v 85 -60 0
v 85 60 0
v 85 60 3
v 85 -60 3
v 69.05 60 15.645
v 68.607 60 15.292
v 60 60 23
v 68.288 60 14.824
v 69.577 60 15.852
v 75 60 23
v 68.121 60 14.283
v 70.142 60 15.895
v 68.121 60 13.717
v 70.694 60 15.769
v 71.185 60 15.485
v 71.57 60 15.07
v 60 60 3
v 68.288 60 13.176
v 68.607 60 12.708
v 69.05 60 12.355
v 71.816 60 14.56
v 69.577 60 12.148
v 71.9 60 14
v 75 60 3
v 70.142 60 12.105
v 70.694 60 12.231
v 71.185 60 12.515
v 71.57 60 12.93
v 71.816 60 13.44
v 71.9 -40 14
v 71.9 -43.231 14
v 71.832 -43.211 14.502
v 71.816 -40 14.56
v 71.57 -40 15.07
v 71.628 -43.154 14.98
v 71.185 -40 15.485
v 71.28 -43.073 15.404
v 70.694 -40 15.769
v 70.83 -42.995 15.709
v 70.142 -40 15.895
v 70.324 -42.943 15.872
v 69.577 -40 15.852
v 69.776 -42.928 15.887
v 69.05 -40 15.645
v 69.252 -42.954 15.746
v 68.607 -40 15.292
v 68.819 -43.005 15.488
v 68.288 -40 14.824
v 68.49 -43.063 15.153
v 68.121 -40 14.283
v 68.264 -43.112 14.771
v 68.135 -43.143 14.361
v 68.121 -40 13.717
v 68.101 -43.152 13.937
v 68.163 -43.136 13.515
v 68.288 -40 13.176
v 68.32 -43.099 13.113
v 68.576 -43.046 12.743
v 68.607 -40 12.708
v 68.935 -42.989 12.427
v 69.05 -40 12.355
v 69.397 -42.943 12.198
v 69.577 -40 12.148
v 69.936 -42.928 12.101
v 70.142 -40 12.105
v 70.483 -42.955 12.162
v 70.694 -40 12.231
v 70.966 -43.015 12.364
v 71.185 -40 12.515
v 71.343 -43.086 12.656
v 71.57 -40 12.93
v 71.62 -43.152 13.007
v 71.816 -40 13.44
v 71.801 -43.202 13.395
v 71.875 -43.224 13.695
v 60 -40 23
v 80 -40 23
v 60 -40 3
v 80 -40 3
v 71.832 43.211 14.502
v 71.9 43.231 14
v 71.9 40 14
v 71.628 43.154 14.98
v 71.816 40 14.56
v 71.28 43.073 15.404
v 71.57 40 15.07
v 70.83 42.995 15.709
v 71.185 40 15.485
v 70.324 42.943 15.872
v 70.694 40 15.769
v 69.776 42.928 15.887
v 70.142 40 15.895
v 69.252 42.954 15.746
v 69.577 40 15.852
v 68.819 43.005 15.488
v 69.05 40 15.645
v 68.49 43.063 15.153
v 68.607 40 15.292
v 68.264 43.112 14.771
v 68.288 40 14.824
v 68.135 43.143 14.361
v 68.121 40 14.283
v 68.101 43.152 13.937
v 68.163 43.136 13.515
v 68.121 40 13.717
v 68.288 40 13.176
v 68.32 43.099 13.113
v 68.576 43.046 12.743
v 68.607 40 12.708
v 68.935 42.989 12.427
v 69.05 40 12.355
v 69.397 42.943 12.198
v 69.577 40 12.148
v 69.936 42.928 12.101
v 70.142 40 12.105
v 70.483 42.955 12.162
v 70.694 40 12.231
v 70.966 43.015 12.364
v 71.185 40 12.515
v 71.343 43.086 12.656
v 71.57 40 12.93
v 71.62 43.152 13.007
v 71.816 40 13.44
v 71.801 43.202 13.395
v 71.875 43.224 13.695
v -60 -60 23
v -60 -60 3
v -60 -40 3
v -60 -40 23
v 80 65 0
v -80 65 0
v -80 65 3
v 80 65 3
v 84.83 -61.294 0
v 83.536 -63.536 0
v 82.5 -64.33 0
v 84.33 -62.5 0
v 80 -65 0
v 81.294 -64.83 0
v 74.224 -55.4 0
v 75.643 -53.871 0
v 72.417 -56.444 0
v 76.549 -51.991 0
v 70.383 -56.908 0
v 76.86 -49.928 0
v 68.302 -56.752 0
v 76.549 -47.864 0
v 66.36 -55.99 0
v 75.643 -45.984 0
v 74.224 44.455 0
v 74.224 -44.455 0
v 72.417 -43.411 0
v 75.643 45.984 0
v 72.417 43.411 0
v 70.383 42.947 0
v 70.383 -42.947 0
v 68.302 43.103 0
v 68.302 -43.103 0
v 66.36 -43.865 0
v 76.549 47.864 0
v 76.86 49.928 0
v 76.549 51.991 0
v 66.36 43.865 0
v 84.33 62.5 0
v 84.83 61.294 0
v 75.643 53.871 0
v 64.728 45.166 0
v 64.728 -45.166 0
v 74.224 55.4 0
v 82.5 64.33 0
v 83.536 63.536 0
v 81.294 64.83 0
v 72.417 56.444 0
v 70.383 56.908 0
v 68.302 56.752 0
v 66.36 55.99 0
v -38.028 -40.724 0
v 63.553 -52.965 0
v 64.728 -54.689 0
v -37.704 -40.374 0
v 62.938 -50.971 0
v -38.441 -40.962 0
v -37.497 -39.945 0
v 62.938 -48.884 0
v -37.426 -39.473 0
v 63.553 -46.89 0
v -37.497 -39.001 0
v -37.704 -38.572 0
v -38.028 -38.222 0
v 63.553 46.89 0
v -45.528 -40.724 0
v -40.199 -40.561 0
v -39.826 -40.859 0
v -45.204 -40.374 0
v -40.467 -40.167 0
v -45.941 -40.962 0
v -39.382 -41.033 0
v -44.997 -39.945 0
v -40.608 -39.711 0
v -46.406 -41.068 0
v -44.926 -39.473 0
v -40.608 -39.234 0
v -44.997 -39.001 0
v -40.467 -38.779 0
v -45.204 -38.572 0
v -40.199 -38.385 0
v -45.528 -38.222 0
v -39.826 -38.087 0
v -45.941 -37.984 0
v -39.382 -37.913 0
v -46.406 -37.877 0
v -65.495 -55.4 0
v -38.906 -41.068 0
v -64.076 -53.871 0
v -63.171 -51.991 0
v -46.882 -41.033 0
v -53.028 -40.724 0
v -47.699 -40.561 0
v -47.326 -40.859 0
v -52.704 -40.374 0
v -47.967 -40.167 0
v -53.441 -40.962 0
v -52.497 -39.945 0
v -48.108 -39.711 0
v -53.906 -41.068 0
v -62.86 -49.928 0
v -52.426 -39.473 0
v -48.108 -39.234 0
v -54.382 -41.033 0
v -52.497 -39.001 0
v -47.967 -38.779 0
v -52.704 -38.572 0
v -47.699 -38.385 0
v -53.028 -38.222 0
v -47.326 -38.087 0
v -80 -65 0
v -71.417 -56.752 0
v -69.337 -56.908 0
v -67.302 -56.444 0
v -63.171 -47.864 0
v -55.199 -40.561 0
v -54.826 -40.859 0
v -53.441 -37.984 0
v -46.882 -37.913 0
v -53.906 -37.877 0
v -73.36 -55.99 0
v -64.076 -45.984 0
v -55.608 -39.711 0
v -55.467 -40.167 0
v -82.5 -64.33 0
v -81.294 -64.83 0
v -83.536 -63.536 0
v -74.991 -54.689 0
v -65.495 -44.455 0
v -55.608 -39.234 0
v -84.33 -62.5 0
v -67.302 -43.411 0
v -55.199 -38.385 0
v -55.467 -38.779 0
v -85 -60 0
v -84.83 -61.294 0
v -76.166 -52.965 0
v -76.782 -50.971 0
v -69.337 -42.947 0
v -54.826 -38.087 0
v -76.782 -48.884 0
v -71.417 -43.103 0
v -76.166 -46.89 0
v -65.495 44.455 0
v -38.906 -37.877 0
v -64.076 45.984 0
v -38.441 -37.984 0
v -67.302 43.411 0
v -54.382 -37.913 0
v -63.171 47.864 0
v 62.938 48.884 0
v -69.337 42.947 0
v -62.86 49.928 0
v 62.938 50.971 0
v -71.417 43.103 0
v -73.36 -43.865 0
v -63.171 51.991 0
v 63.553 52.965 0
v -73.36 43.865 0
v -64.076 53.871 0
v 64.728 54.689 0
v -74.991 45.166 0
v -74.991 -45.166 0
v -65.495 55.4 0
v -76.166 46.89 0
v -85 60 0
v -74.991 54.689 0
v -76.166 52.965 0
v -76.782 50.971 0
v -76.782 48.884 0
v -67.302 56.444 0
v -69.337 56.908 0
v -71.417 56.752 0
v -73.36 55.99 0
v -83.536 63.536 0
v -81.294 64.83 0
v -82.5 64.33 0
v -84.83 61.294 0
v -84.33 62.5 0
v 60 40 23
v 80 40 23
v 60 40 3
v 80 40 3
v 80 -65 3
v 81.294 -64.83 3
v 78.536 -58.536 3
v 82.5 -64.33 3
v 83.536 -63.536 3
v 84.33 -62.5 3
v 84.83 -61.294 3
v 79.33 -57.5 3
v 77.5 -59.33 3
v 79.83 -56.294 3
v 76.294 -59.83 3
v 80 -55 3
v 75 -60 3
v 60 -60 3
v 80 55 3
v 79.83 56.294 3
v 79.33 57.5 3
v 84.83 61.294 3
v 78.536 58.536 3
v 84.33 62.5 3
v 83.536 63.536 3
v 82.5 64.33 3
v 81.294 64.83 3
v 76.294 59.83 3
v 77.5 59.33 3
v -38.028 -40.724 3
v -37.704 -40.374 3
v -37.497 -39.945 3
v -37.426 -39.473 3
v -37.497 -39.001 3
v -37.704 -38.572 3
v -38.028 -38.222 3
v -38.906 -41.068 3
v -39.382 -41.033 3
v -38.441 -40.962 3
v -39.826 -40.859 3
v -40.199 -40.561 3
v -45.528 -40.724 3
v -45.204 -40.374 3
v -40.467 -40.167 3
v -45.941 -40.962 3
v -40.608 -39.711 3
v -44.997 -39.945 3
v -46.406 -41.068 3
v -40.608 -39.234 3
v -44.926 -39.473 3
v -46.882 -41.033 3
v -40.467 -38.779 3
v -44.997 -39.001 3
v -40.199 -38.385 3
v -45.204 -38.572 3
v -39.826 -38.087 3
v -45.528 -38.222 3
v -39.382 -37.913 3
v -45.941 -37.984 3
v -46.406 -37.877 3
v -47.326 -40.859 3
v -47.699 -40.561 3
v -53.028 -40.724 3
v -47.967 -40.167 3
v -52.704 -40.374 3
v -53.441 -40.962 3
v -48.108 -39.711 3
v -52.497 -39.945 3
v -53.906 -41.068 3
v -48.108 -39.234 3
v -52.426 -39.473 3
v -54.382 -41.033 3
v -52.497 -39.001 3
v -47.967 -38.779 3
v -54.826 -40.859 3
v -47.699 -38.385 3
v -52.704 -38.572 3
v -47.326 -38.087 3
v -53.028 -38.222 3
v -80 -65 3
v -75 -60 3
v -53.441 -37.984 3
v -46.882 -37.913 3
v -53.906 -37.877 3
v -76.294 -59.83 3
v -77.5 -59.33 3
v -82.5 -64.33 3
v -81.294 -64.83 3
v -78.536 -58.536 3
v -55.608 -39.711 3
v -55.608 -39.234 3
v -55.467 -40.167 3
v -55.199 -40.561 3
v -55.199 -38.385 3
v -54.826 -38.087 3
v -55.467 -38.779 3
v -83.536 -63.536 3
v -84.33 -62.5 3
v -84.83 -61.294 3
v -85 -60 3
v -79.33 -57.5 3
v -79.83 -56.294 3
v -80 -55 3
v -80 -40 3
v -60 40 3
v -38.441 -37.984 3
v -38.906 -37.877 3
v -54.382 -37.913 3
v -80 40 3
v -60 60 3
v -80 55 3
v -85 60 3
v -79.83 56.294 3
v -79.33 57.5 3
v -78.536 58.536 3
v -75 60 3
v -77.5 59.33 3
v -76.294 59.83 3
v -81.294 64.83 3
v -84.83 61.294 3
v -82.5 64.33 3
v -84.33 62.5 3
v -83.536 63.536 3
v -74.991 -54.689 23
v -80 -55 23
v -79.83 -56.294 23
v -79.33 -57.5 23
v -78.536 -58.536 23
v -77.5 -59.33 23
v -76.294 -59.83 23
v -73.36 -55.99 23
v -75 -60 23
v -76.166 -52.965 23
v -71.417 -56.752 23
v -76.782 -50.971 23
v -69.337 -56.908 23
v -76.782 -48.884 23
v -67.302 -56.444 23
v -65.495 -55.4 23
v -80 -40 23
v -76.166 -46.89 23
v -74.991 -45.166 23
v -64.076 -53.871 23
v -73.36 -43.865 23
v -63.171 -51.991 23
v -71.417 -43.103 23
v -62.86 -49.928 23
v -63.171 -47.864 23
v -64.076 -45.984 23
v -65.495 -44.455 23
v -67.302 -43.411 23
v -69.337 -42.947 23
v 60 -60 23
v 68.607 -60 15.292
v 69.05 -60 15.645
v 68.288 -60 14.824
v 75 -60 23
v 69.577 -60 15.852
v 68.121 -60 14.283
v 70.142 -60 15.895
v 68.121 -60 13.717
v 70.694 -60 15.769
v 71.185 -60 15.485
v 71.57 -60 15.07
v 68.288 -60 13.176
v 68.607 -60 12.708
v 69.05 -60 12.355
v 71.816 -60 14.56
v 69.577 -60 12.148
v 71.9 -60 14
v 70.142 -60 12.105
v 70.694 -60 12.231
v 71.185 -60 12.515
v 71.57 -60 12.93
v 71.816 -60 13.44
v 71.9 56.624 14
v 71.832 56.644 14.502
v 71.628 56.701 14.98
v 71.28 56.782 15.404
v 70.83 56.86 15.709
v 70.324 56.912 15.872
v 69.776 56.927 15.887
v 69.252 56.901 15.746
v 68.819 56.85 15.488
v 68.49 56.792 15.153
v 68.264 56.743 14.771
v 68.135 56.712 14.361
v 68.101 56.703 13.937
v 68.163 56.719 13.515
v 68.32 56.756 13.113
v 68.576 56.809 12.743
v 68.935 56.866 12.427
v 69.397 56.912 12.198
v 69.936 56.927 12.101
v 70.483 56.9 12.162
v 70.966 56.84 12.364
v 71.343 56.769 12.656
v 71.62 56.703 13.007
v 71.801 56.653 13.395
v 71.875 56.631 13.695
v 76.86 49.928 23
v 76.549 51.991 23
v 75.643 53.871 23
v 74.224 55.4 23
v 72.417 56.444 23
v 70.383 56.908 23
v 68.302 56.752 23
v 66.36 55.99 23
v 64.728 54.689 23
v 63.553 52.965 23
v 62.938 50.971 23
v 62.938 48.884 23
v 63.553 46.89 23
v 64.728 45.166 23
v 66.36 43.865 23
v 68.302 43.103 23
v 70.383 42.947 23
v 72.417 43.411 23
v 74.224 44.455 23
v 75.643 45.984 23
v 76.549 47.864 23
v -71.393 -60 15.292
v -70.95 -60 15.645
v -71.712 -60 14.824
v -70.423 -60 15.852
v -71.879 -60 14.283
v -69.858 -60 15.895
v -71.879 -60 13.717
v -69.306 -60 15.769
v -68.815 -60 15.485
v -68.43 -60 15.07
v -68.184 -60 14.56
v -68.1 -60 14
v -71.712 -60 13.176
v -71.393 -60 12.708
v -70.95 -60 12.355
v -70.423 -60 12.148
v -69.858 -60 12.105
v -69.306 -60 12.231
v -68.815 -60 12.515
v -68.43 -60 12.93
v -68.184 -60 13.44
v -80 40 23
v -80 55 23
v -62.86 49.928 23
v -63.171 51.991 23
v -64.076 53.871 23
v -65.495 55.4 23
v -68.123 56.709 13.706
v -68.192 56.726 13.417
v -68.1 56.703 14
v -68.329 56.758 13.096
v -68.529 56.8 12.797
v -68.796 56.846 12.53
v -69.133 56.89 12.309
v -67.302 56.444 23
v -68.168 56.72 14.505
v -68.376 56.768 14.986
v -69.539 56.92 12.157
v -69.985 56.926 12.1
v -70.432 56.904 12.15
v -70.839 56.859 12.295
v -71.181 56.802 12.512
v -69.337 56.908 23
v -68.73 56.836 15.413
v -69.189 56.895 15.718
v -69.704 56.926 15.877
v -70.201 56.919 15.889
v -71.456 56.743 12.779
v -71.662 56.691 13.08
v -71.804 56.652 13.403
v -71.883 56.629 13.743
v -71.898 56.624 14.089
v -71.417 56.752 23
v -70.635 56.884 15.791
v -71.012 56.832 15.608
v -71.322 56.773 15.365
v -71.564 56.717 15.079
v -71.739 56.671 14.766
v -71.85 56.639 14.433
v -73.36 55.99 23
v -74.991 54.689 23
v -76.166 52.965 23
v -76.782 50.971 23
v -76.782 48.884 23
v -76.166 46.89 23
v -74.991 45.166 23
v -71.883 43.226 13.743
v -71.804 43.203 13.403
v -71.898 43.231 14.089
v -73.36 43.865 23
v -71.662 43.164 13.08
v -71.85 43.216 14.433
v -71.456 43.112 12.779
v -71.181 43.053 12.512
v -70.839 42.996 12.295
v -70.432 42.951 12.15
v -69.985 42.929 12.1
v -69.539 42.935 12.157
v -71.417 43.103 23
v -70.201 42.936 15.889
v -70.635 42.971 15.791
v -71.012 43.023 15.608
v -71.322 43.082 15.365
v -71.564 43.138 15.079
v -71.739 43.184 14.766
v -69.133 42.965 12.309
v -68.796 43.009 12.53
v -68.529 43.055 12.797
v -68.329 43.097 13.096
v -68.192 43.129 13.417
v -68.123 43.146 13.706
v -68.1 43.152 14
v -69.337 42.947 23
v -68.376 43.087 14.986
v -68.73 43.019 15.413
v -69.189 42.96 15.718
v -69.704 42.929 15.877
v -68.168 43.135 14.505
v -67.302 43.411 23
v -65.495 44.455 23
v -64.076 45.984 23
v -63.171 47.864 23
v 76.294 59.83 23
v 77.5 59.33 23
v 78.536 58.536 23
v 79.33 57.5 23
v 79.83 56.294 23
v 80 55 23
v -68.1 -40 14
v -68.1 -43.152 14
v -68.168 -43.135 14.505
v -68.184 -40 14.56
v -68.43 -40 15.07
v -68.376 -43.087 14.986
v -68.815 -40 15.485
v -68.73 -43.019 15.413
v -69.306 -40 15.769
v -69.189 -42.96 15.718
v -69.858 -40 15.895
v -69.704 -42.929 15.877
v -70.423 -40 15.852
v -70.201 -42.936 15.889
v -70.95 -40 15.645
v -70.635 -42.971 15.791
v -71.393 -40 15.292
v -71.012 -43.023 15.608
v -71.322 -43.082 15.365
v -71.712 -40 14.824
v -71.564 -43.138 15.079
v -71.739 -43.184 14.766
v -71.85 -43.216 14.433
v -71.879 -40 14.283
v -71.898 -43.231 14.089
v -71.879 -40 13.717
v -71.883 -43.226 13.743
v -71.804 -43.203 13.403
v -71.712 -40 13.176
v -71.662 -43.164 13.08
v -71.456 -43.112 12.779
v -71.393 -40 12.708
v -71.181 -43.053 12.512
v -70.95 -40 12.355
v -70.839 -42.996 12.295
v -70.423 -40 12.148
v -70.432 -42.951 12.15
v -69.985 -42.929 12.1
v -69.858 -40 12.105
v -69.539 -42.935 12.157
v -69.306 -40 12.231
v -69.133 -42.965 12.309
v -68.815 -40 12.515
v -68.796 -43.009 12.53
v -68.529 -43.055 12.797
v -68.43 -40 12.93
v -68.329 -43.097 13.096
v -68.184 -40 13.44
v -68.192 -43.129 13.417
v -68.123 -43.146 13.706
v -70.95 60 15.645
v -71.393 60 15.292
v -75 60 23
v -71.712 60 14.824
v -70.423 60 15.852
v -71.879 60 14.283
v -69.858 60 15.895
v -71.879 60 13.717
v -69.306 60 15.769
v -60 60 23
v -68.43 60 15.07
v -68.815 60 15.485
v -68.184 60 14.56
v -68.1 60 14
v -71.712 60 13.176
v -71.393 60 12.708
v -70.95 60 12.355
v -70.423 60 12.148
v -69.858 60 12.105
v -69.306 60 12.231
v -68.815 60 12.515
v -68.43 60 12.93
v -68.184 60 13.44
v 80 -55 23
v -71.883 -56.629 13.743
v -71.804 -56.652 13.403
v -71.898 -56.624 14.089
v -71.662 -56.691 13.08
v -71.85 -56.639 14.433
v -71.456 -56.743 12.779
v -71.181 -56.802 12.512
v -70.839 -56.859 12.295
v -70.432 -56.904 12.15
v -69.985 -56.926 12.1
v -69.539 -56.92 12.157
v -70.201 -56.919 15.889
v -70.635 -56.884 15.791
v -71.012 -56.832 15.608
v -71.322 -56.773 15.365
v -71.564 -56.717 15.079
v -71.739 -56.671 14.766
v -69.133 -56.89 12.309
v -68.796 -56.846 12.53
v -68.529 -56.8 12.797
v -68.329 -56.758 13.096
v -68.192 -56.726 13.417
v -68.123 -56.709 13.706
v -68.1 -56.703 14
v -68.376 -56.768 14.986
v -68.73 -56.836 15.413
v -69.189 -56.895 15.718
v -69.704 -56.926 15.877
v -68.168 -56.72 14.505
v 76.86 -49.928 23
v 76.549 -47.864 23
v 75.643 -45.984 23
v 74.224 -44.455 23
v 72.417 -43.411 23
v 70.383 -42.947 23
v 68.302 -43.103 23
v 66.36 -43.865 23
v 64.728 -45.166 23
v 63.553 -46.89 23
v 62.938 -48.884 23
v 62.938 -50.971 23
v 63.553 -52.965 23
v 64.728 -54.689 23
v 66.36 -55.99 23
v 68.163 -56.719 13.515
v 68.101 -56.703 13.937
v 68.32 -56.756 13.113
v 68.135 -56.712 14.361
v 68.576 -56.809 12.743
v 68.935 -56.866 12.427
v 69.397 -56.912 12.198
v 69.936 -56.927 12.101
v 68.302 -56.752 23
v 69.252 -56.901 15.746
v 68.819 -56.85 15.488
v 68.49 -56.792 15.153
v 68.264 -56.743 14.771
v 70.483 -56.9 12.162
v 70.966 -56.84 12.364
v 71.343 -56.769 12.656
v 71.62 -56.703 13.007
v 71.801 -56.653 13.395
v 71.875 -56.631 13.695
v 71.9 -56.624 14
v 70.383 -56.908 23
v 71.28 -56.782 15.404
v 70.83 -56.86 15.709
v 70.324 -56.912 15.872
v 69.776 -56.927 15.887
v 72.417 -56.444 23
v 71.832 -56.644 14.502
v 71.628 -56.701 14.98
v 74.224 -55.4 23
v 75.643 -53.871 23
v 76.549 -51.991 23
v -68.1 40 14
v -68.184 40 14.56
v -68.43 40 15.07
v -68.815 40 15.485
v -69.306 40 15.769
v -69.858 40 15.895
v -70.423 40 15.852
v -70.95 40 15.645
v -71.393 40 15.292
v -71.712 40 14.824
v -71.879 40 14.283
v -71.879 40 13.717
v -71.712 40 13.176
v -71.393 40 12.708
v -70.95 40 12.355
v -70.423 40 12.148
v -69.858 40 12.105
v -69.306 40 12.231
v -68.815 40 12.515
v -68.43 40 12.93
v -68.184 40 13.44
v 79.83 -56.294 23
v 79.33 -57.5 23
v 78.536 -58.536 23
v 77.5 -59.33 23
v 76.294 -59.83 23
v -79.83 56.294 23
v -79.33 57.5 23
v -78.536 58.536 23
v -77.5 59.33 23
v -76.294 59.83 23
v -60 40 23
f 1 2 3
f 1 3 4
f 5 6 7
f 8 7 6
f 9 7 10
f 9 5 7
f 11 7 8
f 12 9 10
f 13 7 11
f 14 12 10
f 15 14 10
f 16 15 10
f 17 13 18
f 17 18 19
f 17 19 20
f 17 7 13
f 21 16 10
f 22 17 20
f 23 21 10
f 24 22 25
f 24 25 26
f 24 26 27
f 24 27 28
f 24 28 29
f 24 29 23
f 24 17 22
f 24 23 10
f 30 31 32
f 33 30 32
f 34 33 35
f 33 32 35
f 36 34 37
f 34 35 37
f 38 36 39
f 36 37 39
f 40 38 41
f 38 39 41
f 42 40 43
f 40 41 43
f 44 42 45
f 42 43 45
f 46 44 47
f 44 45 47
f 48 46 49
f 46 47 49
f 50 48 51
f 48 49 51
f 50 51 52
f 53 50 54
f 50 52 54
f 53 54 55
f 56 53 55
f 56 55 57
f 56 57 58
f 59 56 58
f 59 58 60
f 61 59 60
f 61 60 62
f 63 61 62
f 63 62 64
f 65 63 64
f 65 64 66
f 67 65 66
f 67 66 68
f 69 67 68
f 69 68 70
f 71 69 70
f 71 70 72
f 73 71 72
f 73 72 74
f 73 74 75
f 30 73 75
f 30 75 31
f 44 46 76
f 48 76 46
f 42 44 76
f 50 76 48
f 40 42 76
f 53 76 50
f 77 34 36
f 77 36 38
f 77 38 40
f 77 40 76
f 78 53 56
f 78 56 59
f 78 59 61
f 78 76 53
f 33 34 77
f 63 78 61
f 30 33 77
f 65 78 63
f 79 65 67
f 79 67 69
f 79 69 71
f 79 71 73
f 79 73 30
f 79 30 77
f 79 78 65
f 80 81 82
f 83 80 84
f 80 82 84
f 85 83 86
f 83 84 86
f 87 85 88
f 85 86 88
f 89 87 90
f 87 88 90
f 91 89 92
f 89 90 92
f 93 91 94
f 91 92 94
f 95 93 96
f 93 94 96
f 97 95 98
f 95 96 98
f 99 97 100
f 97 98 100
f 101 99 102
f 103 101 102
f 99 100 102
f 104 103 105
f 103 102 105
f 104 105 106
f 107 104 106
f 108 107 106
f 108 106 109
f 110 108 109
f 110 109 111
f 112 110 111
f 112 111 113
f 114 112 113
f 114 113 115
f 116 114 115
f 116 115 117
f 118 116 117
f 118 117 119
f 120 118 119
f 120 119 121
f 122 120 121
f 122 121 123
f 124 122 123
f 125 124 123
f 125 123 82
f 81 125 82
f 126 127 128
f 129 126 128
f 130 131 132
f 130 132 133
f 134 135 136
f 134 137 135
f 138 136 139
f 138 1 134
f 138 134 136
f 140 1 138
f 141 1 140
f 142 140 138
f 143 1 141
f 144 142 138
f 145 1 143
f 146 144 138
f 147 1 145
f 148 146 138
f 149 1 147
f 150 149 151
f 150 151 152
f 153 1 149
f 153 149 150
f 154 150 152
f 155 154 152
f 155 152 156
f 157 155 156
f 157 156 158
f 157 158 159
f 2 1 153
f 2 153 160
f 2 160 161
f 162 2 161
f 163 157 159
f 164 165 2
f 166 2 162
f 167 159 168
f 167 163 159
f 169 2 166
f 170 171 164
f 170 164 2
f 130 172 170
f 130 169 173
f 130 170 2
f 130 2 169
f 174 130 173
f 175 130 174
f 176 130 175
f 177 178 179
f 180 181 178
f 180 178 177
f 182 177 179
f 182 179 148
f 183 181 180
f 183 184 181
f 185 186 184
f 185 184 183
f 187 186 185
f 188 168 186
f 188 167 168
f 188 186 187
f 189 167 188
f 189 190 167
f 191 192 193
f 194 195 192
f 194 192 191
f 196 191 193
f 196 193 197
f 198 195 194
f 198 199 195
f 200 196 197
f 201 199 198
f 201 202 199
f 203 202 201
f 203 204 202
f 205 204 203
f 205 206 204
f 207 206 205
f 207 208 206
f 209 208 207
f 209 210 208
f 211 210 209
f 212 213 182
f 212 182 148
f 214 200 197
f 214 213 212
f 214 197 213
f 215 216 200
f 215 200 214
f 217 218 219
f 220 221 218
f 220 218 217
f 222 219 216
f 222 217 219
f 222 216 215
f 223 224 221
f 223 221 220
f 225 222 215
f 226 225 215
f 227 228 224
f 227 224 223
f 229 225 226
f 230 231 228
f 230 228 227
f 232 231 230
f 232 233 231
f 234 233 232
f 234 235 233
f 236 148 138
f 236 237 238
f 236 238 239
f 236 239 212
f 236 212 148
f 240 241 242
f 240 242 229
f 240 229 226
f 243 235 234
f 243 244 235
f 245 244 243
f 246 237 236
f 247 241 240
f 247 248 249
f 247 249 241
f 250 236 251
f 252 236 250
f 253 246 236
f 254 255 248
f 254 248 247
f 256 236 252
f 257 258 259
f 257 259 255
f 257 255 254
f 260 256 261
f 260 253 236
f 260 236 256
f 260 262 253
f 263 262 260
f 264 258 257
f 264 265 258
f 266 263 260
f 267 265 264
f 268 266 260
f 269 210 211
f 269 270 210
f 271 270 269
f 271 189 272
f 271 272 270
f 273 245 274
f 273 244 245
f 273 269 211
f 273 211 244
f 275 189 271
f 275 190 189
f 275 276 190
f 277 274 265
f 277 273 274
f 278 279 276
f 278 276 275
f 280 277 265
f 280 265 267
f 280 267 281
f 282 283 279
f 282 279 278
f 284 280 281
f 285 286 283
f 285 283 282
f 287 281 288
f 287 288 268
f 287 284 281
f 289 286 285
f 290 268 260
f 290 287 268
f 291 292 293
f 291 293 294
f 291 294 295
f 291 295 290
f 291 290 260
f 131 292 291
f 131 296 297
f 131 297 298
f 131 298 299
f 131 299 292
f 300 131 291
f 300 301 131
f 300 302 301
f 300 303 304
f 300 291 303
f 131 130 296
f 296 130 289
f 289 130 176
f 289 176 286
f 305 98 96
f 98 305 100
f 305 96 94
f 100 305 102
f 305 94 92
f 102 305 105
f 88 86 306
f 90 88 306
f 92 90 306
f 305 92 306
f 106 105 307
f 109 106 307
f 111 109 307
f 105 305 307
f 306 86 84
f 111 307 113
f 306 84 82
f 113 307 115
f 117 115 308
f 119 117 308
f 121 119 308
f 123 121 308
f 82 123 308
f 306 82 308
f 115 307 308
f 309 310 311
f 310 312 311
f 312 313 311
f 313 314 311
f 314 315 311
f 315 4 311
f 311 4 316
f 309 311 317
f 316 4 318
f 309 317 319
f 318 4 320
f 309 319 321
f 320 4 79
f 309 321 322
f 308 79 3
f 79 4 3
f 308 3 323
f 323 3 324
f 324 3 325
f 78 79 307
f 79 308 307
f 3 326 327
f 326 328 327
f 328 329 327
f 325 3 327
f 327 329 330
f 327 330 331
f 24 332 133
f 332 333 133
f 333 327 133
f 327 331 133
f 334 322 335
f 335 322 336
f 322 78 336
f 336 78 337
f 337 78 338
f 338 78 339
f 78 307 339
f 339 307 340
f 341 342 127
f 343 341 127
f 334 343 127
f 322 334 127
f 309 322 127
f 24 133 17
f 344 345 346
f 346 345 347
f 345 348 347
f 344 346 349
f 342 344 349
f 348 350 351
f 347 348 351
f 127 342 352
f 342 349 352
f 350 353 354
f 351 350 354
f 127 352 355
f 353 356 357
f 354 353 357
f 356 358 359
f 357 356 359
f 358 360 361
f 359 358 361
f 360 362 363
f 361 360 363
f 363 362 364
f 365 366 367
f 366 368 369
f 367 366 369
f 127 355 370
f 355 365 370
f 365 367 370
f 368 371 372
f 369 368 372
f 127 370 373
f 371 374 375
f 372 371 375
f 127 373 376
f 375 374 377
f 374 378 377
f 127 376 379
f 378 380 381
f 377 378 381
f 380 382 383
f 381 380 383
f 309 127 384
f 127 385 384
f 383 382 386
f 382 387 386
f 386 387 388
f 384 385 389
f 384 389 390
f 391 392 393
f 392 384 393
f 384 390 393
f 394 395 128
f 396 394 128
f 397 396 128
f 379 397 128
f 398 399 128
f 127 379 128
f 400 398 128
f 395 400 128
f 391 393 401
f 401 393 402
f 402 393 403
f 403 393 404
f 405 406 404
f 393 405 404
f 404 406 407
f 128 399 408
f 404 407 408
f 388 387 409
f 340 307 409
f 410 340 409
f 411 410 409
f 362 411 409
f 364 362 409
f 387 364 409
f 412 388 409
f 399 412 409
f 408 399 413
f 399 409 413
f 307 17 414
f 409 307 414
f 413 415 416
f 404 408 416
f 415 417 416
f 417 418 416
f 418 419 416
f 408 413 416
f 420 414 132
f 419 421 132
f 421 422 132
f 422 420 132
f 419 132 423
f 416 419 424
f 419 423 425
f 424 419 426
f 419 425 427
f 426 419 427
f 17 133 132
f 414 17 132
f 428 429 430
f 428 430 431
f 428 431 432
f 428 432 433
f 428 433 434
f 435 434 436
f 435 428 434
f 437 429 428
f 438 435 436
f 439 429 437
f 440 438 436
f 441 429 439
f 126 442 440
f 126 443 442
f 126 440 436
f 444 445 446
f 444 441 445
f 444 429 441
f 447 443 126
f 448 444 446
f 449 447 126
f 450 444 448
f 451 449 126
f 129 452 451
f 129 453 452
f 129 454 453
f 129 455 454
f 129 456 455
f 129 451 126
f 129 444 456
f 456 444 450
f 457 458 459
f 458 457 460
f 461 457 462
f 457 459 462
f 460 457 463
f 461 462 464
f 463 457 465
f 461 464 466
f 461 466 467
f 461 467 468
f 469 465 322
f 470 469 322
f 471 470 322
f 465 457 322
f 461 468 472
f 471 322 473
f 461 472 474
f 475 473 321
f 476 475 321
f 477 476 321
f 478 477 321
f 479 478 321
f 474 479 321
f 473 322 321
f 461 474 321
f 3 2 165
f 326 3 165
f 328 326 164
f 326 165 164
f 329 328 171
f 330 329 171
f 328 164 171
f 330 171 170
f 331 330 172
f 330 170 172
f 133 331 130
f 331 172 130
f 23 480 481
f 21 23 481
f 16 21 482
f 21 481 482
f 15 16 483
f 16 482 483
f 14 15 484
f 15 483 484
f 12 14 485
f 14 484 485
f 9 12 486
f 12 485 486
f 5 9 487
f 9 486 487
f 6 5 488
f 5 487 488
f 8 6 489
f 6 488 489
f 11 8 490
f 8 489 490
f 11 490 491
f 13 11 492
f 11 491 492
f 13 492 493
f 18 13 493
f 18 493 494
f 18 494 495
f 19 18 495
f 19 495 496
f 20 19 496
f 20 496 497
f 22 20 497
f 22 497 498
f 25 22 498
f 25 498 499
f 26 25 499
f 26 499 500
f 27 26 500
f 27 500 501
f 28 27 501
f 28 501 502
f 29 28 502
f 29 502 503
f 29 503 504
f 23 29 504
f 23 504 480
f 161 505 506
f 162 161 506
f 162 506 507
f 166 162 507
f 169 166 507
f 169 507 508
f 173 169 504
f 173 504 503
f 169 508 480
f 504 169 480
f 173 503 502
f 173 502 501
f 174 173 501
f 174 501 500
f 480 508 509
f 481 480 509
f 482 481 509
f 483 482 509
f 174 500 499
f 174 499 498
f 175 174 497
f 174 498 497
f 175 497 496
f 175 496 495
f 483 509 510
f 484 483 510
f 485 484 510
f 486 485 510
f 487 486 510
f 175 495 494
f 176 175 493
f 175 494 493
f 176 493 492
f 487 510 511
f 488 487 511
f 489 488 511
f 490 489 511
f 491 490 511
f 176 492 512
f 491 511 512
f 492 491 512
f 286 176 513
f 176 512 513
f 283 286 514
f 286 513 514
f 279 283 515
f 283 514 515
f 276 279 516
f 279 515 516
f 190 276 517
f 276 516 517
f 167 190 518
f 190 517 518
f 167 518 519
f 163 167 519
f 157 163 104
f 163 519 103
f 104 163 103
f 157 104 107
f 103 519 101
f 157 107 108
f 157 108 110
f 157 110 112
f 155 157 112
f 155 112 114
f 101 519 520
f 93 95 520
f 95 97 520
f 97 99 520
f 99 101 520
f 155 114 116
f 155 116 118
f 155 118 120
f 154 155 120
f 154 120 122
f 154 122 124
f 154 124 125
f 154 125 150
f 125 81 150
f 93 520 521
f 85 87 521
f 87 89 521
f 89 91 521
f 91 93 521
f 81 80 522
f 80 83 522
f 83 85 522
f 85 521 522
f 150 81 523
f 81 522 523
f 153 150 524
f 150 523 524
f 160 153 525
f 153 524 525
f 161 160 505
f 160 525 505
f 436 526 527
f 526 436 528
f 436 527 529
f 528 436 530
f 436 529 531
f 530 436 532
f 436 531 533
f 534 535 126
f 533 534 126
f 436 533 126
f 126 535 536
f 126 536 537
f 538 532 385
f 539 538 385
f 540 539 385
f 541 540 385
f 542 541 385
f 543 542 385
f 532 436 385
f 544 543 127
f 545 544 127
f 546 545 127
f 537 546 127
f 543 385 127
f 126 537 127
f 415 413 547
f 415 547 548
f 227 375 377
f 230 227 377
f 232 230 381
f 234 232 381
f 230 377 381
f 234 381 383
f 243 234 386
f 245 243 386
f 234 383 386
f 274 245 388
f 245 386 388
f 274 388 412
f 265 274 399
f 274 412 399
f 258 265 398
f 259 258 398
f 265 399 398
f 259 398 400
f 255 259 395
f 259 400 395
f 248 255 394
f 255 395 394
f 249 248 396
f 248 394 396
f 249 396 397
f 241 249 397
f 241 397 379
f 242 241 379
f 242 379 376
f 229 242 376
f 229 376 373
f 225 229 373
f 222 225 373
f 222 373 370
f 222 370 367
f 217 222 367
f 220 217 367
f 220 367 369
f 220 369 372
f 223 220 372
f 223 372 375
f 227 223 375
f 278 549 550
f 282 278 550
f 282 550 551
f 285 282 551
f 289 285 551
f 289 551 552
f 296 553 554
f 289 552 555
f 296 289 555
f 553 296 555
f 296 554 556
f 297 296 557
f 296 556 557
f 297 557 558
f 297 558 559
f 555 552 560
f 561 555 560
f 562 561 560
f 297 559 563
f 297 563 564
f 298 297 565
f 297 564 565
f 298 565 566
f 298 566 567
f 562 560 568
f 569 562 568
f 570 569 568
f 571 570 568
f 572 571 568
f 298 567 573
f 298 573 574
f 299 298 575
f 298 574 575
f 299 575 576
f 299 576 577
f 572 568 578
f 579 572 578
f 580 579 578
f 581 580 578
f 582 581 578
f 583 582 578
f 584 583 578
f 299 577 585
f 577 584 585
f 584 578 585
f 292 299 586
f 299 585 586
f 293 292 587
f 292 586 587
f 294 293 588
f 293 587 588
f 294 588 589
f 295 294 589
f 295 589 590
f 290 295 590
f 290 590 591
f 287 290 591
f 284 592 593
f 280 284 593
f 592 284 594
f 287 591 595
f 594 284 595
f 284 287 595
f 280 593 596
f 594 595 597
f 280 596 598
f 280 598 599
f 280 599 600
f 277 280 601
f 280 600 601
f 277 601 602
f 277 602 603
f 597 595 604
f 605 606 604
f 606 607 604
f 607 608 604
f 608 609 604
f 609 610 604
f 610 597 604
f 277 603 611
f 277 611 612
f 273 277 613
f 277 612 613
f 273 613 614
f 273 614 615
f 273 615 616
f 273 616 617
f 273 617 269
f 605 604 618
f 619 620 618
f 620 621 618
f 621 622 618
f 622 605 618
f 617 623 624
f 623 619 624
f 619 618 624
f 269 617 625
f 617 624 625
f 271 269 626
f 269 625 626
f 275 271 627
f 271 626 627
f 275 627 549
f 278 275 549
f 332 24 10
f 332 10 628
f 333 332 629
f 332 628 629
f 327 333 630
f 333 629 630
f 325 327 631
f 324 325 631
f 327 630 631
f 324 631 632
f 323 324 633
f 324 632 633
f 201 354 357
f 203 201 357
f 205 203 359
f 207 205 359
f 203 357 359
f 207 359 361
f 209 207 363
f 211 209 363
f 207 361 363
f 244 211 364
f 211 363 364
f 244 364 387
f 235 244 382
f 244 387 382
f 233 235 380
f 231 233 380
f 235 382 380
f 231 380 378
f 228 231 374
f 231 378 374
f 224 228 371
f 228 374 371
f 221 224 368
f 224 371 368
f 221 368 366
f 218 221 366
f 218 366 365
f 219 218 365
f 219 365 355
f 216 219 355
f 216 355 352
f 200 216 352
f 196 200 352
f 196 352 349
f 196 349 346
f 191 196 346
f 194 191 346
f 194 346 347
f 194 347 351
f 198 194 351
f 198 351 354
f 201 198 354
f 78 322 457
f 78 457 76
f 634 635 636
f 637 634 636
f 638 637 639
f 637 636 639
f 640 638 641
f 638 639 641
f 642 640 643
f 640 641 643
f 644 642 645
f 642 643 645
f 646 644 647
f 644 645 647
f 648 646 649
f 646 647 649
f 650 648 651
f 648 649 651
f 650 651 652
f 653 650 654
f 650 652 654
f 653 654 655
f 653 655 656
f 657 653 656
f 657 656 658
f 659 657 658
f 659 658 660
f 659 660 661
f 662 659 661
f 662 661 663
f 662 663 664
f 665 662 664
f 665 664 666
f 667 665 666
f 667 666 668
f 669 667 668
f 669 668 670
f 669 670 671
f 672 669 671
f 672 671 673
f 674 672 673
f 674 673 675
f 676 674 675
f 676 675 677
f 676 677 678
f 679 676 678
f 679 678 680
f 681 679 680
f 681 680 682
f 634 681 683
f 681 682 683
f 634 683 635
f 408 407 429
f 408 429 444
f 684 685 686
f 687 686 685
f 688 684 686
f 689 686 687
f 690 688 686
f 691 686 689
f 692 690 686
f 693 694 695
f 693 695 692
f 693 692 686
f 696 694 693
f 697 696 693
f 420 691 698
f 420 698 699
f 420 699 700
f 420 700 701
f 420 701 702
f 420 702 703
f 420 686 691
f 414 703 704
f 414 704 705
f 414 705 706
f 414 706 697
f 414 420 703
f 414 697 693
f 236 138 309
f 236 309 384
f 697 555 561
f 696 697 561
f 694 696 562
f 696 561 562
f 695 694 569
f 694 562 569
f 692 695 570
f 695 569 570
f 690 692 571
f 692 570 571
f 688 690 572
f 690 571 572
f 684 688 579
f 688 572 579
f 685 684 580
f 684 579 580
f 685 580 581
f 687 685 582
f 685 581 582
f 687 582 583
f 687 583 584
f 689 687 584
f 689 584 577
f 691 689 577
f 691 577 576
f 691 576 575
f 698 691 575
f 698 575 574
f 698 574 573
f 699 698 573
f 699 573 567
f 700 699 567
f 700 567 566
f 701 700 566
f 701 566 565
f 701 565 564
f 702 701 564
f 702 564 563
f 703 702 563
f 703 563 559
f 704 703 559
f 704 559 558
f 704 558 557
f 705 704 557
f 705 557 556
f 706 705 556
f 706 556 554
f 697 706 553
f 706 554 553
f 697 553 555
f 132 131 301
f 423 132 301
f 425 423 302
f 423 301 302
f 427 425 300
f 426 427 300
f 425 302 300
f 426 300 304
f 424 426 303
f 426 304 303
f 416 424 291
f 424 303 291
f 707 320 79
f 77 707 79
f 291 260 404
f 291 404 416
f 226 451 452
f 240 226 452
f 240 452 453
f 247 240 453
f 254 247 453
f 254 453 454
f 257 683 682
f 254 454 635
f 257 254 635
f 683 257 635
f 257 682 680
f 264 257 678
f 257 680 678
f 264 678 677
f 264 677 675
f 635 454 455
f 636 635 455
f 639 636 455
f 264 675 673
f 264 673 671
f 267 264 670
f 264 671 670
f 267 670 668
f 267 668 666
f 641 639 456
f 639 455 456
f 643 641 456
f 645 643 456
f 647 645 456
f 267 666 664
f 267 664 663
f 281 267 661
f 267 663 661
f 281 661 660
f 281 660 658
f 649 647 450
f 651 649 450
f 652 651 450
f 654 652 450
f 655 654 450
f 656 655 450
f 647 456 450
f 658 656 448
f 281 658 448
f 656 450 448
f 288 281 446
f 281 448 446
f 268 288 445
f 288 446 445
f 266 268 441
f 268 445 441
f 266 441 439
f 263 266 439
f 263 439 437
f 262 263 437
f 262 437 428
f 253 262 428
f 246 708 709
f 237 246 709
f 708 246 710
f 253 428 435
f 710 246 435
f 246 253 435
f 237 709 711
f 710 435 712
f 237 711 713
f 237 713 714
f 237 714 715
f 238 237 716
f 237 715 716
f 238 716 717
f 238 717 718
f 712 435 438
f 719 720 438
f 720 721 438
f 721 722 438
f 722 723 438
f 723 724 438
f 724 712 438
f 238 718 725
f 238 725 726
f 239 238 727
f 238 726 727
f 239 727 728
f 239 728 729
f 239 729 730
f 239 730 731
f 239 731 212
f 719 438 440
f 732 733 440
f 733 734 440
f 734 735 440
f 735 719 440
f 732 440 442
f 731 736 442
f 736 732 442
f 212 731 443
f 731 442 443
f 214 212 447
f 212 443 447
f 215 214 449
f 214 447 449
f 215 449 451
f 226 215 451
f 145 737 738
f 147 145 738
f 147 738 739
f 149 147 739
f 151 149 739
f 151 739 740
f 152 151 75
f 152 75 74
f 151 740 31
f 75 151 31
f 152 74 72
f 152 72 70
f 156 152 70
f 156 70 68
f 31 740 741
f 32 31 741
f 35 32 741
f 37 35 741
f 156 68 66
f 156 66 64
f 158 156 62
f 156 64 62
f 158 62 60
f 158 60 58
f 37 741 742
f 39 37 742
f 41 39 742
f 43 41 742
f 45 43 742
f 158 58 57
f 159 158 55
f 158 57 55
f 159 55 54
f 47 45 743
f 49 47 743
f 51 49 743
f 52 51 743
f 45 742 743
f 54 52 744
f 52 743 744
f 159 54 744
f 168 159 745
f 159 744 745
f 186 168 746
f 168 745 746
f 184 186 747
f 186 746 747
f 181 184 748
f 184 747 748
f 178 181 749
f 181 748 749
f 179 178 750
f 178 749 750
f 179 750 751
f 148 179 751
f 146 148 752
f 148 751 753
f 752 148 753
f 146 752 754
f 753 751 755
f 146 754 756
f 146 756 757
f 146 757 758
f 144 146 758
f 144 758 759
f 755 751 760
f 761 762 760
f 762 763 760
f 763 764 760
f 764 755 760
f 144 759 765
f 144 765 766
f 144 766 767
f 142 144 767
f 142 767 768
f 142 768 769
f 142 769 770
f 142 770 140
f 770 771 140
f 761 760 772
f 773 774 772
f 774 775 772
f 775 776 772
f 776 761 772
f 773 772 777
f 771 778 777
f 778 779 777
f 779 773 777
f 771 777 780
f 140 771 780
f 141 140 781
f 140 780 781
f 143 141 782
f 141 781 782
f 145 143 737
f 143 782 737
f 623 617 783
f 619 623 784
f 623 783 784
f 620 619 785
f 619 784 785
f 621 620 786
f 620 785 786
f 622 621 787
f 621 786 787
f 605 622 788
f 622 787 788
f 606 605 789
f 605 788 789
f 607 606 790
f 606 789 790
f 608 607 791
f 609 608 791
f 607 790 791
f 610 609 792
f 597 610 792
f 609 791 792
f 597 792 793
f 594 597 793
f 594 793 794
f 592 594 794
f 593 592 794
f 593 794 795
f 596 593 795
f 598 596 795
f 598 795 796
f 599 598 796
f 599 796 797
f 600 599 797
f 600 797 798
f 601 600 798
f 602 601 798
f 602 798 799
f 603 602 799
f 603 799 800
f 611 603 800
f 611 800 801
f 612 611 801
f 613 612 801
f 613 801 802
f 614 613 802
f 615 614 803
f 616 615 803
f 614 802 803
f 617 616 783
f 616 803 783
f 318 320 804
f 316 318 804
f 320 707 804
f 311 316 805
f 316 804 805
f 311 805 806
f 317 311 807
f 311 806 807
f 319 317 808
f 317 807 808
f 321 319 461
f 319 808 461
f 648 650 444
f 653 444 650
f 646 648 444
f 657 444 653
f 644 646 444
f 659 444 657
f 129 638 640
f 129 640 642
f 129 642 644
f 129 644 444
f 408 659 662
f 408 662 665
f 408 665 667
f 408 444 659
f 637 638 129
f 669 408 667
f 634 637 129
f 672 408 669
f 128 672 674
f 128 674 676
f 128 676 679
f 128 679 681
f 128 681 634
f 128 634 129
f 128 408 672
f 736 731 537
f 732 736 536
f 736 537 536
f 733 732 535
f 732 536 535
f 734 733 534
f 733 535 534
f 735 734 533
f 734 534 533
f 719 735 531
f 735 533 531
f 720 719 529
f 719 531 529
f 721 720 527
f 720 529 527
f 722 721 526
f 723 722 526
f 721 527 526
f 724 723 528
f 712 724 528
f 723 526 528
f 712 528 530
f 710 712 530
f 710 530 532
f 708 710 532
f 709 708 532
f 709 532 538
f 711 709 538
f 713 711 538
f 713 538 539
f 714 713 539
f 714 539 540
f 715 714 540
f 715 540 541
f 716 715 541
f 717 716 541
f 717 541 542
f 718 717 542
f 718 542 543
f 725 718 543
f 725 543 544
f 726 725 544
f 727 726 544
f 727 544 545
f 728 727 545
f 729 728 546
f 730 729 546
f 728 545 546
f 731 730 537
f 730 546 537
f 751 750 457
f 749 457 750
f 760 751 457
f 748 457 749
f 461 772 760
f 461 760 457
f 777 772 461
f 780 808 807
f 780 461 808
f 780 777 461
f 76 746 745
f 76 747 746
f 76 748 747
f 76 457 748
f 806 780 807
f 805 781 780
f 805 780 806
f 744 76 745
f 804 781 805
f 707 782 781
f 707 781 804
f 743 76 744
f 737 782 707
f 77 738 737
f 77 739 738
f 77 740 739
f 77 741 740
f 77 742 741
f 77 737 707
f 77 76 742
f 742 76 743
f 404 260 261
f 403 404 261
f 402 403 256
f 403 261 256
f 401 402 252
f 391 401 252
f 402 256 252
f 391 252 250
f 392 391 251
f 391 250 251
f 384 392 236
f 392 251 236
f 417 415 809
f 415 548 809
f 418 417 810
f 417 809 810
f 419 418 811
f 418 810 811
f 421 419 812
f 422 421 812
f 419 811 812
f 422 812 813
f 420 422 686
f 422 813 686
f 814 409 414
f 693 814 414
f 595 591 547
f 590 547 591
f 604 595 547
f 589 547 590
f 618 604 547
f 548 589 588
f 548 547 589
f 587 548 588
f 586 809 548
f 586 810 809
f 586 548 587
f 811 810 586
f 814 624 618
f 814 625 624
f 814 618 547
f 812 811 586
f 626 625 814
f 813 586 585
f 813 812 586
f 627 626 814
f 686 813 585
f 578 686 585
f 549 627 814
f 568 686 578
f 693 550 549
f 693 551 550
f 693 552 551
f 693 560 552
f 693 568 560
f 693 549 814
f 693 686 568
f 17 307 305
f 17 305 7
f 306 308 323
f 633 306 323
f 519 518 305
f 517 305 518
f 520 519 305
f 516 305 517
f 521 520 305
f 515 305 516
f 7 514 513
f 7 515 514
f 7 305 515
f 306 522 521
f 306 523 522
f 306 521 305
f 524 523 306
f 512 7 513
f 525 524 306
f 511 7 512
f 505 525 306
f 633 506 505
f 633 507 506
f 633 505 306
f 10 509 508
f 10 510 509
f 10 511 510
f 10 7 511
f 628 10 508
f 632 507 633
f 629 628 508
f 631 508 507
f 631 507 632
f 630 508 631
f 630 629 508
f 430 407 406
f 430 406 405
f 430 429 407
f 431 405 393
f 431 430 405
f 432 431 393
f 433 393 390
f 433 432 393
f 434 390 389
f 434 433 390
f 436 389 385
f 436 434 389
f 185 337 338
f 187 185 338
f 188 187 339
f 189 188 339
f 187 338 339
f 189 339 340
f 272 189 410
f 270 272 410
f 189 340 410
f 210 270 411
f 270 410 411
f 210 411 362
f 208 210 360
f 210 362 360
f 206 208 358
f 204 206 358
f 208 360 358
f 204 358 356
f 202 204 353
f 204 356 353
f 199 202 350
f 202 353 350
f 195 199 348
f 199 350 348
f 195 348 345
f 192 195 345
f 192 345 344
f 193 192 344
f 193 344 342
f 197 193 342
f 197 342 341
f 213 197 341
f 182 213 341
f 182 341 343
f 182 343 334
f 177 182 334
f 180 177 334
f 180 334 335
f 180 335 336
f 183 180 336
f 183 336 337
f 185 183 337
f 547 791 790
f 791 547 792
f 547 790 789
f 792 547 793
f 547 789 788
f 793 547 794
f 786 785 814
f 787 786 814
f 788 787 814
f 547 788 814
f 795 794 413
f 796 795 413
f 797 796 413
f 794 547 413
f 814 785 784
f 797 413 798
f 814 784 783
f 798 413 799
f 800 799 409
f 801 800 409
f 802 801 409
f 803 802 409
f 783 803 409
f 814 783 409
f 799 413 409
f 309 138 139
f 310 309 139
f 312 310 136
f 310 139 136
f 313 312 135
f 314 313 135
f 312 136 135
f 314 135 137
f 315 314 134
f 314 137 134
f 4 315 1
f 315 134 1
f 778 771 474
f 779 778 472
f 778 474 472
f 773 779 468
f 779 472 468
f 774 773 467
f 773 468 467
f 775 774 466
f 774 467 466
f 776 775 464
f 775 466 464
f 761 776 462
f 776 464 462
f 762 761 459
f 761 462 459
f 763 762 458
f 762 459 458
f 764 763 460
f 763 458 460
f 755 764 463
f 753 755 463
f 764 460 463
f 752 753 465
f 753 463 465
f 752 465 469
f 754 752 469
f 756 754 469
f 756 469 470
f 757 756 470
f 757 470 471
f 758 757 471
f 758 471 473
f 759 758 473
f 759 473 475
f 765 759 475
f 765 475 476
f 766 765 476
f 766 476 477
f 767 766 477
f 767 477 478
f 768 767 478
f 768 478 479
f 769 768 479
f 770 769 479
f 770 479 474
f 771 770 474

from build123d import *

# Parameters (mm, degrees)
PAD_DEPTH       = 3
SKETCH002_W     = 20
SKETCH002_H     = 20
PAD001_DEPTH    = 20
FILLET_R        = 5
SKETCH003_R     = 1.9
POCKET_DEPTH    = 125.001
SKETCH004_R     = 7
POCKET001_DEPTH = 23.001
SKETCH005_R     = 1.6
POCKET002_DEPTH = 3.001


with BuildPart() as part:
    # Sketch → Pad (new body)
    with BuildSketch(Plane.XY):
        with BuildLine():
            Line((-80, 65), (80, 65))
            ThreePointArc((85, 60), (83.535534, 63.535534), (80, 65))
            Line((85, 60), (85, -60))
            ThreePointArc((80, -65), (83.535534, -63.535534), (85, -60))
            Line((80, -65), (-80, -65))
            ThreePointArc((-85, -60), (-83.535534, -63.535534), (-80, -65))
            Line((-85, -60), (-85, 60))
            ThreePointArc((-80, 65), (-83.535534, 63.535534), (-85, 60))
        make_face()
    extrude(amount=PAD_DEPTH)

    # Sketch002 → Pad001 (new body)
    with BuildSketch(Plane.XY.offset(3)):
        with Locations((-70, 50)):
            Rectangle(SKETCH002_W, SKETCH002_H)
        with Locations((70, 50)):
            Rectangle(SKETCH002_W, SKETCH002_H)
        with Locations((70, -50)):
            Rectangle(SKETCH002_W, SKETCH002_H)
        with Locations((-70, -50)):
            Rectangle(SKETCH002_W, SKETCH002_H)
    extrude(amount=PAD001_DEPTH)

    # Fillet
    fillet_edges = [part.edges().sort_by_distance(p)[0] for p in [
        (-80, 60, 13),
        (80, 60, 13),
        (-80, -60, 13),
        (80, -60, 13),
    ]]
    fillet(fillet_edges, radius=FILLET_R)

    # Sketch003 → Pocket (cut, through all)
    with BuildSketch(Plane.XZ.offset(60)):
        with Locations((-70, 14)):
            Circle(SKETCH003_R)
        with Locations((70, 14)):
            Circle(SKETCH003_R)
    extrude(amount=-POCKET_DEPTH, mode=Mode.SUBTRACT)

    # Sketch004 → Pocket001 (cut, through all)
    with BuildSketch(Plane.XY.offset(23)):
        with Locations((-69.859705, 49.927501)):
            Circle(SKETCH004_R)
        with Locations((69.859705, 49.927501)):
            Circle(SKETCH004_R)
        with Locations((69.859705, -49.927501)):
            Circle(SKETCH004_R)
        with Locations((-69.859705, -49.927501)):
            Circle(SKETCH004_R)
    extrude(amount=-POCKET001_DEPTH, mode=Mode.SUBTRACT)

    # Sketch005 → Pocket002 (cut, through all)
    with BuildSketch(Plane.XY.offset(3)):
        with Locations((-54.025897, -39.472939)):
            Circle(SKETCH005_R)
        with Locations((-46.525897, -39.472939)):
            Circle(SKETCH005_R)
        with Locations((-39.025897, -39.472939)):
            Circle(SKETCH005_R)
    extrude(amount=-POCKET002_DEPTH, mode=Mode.SUBTRACT)


solid = part.part
